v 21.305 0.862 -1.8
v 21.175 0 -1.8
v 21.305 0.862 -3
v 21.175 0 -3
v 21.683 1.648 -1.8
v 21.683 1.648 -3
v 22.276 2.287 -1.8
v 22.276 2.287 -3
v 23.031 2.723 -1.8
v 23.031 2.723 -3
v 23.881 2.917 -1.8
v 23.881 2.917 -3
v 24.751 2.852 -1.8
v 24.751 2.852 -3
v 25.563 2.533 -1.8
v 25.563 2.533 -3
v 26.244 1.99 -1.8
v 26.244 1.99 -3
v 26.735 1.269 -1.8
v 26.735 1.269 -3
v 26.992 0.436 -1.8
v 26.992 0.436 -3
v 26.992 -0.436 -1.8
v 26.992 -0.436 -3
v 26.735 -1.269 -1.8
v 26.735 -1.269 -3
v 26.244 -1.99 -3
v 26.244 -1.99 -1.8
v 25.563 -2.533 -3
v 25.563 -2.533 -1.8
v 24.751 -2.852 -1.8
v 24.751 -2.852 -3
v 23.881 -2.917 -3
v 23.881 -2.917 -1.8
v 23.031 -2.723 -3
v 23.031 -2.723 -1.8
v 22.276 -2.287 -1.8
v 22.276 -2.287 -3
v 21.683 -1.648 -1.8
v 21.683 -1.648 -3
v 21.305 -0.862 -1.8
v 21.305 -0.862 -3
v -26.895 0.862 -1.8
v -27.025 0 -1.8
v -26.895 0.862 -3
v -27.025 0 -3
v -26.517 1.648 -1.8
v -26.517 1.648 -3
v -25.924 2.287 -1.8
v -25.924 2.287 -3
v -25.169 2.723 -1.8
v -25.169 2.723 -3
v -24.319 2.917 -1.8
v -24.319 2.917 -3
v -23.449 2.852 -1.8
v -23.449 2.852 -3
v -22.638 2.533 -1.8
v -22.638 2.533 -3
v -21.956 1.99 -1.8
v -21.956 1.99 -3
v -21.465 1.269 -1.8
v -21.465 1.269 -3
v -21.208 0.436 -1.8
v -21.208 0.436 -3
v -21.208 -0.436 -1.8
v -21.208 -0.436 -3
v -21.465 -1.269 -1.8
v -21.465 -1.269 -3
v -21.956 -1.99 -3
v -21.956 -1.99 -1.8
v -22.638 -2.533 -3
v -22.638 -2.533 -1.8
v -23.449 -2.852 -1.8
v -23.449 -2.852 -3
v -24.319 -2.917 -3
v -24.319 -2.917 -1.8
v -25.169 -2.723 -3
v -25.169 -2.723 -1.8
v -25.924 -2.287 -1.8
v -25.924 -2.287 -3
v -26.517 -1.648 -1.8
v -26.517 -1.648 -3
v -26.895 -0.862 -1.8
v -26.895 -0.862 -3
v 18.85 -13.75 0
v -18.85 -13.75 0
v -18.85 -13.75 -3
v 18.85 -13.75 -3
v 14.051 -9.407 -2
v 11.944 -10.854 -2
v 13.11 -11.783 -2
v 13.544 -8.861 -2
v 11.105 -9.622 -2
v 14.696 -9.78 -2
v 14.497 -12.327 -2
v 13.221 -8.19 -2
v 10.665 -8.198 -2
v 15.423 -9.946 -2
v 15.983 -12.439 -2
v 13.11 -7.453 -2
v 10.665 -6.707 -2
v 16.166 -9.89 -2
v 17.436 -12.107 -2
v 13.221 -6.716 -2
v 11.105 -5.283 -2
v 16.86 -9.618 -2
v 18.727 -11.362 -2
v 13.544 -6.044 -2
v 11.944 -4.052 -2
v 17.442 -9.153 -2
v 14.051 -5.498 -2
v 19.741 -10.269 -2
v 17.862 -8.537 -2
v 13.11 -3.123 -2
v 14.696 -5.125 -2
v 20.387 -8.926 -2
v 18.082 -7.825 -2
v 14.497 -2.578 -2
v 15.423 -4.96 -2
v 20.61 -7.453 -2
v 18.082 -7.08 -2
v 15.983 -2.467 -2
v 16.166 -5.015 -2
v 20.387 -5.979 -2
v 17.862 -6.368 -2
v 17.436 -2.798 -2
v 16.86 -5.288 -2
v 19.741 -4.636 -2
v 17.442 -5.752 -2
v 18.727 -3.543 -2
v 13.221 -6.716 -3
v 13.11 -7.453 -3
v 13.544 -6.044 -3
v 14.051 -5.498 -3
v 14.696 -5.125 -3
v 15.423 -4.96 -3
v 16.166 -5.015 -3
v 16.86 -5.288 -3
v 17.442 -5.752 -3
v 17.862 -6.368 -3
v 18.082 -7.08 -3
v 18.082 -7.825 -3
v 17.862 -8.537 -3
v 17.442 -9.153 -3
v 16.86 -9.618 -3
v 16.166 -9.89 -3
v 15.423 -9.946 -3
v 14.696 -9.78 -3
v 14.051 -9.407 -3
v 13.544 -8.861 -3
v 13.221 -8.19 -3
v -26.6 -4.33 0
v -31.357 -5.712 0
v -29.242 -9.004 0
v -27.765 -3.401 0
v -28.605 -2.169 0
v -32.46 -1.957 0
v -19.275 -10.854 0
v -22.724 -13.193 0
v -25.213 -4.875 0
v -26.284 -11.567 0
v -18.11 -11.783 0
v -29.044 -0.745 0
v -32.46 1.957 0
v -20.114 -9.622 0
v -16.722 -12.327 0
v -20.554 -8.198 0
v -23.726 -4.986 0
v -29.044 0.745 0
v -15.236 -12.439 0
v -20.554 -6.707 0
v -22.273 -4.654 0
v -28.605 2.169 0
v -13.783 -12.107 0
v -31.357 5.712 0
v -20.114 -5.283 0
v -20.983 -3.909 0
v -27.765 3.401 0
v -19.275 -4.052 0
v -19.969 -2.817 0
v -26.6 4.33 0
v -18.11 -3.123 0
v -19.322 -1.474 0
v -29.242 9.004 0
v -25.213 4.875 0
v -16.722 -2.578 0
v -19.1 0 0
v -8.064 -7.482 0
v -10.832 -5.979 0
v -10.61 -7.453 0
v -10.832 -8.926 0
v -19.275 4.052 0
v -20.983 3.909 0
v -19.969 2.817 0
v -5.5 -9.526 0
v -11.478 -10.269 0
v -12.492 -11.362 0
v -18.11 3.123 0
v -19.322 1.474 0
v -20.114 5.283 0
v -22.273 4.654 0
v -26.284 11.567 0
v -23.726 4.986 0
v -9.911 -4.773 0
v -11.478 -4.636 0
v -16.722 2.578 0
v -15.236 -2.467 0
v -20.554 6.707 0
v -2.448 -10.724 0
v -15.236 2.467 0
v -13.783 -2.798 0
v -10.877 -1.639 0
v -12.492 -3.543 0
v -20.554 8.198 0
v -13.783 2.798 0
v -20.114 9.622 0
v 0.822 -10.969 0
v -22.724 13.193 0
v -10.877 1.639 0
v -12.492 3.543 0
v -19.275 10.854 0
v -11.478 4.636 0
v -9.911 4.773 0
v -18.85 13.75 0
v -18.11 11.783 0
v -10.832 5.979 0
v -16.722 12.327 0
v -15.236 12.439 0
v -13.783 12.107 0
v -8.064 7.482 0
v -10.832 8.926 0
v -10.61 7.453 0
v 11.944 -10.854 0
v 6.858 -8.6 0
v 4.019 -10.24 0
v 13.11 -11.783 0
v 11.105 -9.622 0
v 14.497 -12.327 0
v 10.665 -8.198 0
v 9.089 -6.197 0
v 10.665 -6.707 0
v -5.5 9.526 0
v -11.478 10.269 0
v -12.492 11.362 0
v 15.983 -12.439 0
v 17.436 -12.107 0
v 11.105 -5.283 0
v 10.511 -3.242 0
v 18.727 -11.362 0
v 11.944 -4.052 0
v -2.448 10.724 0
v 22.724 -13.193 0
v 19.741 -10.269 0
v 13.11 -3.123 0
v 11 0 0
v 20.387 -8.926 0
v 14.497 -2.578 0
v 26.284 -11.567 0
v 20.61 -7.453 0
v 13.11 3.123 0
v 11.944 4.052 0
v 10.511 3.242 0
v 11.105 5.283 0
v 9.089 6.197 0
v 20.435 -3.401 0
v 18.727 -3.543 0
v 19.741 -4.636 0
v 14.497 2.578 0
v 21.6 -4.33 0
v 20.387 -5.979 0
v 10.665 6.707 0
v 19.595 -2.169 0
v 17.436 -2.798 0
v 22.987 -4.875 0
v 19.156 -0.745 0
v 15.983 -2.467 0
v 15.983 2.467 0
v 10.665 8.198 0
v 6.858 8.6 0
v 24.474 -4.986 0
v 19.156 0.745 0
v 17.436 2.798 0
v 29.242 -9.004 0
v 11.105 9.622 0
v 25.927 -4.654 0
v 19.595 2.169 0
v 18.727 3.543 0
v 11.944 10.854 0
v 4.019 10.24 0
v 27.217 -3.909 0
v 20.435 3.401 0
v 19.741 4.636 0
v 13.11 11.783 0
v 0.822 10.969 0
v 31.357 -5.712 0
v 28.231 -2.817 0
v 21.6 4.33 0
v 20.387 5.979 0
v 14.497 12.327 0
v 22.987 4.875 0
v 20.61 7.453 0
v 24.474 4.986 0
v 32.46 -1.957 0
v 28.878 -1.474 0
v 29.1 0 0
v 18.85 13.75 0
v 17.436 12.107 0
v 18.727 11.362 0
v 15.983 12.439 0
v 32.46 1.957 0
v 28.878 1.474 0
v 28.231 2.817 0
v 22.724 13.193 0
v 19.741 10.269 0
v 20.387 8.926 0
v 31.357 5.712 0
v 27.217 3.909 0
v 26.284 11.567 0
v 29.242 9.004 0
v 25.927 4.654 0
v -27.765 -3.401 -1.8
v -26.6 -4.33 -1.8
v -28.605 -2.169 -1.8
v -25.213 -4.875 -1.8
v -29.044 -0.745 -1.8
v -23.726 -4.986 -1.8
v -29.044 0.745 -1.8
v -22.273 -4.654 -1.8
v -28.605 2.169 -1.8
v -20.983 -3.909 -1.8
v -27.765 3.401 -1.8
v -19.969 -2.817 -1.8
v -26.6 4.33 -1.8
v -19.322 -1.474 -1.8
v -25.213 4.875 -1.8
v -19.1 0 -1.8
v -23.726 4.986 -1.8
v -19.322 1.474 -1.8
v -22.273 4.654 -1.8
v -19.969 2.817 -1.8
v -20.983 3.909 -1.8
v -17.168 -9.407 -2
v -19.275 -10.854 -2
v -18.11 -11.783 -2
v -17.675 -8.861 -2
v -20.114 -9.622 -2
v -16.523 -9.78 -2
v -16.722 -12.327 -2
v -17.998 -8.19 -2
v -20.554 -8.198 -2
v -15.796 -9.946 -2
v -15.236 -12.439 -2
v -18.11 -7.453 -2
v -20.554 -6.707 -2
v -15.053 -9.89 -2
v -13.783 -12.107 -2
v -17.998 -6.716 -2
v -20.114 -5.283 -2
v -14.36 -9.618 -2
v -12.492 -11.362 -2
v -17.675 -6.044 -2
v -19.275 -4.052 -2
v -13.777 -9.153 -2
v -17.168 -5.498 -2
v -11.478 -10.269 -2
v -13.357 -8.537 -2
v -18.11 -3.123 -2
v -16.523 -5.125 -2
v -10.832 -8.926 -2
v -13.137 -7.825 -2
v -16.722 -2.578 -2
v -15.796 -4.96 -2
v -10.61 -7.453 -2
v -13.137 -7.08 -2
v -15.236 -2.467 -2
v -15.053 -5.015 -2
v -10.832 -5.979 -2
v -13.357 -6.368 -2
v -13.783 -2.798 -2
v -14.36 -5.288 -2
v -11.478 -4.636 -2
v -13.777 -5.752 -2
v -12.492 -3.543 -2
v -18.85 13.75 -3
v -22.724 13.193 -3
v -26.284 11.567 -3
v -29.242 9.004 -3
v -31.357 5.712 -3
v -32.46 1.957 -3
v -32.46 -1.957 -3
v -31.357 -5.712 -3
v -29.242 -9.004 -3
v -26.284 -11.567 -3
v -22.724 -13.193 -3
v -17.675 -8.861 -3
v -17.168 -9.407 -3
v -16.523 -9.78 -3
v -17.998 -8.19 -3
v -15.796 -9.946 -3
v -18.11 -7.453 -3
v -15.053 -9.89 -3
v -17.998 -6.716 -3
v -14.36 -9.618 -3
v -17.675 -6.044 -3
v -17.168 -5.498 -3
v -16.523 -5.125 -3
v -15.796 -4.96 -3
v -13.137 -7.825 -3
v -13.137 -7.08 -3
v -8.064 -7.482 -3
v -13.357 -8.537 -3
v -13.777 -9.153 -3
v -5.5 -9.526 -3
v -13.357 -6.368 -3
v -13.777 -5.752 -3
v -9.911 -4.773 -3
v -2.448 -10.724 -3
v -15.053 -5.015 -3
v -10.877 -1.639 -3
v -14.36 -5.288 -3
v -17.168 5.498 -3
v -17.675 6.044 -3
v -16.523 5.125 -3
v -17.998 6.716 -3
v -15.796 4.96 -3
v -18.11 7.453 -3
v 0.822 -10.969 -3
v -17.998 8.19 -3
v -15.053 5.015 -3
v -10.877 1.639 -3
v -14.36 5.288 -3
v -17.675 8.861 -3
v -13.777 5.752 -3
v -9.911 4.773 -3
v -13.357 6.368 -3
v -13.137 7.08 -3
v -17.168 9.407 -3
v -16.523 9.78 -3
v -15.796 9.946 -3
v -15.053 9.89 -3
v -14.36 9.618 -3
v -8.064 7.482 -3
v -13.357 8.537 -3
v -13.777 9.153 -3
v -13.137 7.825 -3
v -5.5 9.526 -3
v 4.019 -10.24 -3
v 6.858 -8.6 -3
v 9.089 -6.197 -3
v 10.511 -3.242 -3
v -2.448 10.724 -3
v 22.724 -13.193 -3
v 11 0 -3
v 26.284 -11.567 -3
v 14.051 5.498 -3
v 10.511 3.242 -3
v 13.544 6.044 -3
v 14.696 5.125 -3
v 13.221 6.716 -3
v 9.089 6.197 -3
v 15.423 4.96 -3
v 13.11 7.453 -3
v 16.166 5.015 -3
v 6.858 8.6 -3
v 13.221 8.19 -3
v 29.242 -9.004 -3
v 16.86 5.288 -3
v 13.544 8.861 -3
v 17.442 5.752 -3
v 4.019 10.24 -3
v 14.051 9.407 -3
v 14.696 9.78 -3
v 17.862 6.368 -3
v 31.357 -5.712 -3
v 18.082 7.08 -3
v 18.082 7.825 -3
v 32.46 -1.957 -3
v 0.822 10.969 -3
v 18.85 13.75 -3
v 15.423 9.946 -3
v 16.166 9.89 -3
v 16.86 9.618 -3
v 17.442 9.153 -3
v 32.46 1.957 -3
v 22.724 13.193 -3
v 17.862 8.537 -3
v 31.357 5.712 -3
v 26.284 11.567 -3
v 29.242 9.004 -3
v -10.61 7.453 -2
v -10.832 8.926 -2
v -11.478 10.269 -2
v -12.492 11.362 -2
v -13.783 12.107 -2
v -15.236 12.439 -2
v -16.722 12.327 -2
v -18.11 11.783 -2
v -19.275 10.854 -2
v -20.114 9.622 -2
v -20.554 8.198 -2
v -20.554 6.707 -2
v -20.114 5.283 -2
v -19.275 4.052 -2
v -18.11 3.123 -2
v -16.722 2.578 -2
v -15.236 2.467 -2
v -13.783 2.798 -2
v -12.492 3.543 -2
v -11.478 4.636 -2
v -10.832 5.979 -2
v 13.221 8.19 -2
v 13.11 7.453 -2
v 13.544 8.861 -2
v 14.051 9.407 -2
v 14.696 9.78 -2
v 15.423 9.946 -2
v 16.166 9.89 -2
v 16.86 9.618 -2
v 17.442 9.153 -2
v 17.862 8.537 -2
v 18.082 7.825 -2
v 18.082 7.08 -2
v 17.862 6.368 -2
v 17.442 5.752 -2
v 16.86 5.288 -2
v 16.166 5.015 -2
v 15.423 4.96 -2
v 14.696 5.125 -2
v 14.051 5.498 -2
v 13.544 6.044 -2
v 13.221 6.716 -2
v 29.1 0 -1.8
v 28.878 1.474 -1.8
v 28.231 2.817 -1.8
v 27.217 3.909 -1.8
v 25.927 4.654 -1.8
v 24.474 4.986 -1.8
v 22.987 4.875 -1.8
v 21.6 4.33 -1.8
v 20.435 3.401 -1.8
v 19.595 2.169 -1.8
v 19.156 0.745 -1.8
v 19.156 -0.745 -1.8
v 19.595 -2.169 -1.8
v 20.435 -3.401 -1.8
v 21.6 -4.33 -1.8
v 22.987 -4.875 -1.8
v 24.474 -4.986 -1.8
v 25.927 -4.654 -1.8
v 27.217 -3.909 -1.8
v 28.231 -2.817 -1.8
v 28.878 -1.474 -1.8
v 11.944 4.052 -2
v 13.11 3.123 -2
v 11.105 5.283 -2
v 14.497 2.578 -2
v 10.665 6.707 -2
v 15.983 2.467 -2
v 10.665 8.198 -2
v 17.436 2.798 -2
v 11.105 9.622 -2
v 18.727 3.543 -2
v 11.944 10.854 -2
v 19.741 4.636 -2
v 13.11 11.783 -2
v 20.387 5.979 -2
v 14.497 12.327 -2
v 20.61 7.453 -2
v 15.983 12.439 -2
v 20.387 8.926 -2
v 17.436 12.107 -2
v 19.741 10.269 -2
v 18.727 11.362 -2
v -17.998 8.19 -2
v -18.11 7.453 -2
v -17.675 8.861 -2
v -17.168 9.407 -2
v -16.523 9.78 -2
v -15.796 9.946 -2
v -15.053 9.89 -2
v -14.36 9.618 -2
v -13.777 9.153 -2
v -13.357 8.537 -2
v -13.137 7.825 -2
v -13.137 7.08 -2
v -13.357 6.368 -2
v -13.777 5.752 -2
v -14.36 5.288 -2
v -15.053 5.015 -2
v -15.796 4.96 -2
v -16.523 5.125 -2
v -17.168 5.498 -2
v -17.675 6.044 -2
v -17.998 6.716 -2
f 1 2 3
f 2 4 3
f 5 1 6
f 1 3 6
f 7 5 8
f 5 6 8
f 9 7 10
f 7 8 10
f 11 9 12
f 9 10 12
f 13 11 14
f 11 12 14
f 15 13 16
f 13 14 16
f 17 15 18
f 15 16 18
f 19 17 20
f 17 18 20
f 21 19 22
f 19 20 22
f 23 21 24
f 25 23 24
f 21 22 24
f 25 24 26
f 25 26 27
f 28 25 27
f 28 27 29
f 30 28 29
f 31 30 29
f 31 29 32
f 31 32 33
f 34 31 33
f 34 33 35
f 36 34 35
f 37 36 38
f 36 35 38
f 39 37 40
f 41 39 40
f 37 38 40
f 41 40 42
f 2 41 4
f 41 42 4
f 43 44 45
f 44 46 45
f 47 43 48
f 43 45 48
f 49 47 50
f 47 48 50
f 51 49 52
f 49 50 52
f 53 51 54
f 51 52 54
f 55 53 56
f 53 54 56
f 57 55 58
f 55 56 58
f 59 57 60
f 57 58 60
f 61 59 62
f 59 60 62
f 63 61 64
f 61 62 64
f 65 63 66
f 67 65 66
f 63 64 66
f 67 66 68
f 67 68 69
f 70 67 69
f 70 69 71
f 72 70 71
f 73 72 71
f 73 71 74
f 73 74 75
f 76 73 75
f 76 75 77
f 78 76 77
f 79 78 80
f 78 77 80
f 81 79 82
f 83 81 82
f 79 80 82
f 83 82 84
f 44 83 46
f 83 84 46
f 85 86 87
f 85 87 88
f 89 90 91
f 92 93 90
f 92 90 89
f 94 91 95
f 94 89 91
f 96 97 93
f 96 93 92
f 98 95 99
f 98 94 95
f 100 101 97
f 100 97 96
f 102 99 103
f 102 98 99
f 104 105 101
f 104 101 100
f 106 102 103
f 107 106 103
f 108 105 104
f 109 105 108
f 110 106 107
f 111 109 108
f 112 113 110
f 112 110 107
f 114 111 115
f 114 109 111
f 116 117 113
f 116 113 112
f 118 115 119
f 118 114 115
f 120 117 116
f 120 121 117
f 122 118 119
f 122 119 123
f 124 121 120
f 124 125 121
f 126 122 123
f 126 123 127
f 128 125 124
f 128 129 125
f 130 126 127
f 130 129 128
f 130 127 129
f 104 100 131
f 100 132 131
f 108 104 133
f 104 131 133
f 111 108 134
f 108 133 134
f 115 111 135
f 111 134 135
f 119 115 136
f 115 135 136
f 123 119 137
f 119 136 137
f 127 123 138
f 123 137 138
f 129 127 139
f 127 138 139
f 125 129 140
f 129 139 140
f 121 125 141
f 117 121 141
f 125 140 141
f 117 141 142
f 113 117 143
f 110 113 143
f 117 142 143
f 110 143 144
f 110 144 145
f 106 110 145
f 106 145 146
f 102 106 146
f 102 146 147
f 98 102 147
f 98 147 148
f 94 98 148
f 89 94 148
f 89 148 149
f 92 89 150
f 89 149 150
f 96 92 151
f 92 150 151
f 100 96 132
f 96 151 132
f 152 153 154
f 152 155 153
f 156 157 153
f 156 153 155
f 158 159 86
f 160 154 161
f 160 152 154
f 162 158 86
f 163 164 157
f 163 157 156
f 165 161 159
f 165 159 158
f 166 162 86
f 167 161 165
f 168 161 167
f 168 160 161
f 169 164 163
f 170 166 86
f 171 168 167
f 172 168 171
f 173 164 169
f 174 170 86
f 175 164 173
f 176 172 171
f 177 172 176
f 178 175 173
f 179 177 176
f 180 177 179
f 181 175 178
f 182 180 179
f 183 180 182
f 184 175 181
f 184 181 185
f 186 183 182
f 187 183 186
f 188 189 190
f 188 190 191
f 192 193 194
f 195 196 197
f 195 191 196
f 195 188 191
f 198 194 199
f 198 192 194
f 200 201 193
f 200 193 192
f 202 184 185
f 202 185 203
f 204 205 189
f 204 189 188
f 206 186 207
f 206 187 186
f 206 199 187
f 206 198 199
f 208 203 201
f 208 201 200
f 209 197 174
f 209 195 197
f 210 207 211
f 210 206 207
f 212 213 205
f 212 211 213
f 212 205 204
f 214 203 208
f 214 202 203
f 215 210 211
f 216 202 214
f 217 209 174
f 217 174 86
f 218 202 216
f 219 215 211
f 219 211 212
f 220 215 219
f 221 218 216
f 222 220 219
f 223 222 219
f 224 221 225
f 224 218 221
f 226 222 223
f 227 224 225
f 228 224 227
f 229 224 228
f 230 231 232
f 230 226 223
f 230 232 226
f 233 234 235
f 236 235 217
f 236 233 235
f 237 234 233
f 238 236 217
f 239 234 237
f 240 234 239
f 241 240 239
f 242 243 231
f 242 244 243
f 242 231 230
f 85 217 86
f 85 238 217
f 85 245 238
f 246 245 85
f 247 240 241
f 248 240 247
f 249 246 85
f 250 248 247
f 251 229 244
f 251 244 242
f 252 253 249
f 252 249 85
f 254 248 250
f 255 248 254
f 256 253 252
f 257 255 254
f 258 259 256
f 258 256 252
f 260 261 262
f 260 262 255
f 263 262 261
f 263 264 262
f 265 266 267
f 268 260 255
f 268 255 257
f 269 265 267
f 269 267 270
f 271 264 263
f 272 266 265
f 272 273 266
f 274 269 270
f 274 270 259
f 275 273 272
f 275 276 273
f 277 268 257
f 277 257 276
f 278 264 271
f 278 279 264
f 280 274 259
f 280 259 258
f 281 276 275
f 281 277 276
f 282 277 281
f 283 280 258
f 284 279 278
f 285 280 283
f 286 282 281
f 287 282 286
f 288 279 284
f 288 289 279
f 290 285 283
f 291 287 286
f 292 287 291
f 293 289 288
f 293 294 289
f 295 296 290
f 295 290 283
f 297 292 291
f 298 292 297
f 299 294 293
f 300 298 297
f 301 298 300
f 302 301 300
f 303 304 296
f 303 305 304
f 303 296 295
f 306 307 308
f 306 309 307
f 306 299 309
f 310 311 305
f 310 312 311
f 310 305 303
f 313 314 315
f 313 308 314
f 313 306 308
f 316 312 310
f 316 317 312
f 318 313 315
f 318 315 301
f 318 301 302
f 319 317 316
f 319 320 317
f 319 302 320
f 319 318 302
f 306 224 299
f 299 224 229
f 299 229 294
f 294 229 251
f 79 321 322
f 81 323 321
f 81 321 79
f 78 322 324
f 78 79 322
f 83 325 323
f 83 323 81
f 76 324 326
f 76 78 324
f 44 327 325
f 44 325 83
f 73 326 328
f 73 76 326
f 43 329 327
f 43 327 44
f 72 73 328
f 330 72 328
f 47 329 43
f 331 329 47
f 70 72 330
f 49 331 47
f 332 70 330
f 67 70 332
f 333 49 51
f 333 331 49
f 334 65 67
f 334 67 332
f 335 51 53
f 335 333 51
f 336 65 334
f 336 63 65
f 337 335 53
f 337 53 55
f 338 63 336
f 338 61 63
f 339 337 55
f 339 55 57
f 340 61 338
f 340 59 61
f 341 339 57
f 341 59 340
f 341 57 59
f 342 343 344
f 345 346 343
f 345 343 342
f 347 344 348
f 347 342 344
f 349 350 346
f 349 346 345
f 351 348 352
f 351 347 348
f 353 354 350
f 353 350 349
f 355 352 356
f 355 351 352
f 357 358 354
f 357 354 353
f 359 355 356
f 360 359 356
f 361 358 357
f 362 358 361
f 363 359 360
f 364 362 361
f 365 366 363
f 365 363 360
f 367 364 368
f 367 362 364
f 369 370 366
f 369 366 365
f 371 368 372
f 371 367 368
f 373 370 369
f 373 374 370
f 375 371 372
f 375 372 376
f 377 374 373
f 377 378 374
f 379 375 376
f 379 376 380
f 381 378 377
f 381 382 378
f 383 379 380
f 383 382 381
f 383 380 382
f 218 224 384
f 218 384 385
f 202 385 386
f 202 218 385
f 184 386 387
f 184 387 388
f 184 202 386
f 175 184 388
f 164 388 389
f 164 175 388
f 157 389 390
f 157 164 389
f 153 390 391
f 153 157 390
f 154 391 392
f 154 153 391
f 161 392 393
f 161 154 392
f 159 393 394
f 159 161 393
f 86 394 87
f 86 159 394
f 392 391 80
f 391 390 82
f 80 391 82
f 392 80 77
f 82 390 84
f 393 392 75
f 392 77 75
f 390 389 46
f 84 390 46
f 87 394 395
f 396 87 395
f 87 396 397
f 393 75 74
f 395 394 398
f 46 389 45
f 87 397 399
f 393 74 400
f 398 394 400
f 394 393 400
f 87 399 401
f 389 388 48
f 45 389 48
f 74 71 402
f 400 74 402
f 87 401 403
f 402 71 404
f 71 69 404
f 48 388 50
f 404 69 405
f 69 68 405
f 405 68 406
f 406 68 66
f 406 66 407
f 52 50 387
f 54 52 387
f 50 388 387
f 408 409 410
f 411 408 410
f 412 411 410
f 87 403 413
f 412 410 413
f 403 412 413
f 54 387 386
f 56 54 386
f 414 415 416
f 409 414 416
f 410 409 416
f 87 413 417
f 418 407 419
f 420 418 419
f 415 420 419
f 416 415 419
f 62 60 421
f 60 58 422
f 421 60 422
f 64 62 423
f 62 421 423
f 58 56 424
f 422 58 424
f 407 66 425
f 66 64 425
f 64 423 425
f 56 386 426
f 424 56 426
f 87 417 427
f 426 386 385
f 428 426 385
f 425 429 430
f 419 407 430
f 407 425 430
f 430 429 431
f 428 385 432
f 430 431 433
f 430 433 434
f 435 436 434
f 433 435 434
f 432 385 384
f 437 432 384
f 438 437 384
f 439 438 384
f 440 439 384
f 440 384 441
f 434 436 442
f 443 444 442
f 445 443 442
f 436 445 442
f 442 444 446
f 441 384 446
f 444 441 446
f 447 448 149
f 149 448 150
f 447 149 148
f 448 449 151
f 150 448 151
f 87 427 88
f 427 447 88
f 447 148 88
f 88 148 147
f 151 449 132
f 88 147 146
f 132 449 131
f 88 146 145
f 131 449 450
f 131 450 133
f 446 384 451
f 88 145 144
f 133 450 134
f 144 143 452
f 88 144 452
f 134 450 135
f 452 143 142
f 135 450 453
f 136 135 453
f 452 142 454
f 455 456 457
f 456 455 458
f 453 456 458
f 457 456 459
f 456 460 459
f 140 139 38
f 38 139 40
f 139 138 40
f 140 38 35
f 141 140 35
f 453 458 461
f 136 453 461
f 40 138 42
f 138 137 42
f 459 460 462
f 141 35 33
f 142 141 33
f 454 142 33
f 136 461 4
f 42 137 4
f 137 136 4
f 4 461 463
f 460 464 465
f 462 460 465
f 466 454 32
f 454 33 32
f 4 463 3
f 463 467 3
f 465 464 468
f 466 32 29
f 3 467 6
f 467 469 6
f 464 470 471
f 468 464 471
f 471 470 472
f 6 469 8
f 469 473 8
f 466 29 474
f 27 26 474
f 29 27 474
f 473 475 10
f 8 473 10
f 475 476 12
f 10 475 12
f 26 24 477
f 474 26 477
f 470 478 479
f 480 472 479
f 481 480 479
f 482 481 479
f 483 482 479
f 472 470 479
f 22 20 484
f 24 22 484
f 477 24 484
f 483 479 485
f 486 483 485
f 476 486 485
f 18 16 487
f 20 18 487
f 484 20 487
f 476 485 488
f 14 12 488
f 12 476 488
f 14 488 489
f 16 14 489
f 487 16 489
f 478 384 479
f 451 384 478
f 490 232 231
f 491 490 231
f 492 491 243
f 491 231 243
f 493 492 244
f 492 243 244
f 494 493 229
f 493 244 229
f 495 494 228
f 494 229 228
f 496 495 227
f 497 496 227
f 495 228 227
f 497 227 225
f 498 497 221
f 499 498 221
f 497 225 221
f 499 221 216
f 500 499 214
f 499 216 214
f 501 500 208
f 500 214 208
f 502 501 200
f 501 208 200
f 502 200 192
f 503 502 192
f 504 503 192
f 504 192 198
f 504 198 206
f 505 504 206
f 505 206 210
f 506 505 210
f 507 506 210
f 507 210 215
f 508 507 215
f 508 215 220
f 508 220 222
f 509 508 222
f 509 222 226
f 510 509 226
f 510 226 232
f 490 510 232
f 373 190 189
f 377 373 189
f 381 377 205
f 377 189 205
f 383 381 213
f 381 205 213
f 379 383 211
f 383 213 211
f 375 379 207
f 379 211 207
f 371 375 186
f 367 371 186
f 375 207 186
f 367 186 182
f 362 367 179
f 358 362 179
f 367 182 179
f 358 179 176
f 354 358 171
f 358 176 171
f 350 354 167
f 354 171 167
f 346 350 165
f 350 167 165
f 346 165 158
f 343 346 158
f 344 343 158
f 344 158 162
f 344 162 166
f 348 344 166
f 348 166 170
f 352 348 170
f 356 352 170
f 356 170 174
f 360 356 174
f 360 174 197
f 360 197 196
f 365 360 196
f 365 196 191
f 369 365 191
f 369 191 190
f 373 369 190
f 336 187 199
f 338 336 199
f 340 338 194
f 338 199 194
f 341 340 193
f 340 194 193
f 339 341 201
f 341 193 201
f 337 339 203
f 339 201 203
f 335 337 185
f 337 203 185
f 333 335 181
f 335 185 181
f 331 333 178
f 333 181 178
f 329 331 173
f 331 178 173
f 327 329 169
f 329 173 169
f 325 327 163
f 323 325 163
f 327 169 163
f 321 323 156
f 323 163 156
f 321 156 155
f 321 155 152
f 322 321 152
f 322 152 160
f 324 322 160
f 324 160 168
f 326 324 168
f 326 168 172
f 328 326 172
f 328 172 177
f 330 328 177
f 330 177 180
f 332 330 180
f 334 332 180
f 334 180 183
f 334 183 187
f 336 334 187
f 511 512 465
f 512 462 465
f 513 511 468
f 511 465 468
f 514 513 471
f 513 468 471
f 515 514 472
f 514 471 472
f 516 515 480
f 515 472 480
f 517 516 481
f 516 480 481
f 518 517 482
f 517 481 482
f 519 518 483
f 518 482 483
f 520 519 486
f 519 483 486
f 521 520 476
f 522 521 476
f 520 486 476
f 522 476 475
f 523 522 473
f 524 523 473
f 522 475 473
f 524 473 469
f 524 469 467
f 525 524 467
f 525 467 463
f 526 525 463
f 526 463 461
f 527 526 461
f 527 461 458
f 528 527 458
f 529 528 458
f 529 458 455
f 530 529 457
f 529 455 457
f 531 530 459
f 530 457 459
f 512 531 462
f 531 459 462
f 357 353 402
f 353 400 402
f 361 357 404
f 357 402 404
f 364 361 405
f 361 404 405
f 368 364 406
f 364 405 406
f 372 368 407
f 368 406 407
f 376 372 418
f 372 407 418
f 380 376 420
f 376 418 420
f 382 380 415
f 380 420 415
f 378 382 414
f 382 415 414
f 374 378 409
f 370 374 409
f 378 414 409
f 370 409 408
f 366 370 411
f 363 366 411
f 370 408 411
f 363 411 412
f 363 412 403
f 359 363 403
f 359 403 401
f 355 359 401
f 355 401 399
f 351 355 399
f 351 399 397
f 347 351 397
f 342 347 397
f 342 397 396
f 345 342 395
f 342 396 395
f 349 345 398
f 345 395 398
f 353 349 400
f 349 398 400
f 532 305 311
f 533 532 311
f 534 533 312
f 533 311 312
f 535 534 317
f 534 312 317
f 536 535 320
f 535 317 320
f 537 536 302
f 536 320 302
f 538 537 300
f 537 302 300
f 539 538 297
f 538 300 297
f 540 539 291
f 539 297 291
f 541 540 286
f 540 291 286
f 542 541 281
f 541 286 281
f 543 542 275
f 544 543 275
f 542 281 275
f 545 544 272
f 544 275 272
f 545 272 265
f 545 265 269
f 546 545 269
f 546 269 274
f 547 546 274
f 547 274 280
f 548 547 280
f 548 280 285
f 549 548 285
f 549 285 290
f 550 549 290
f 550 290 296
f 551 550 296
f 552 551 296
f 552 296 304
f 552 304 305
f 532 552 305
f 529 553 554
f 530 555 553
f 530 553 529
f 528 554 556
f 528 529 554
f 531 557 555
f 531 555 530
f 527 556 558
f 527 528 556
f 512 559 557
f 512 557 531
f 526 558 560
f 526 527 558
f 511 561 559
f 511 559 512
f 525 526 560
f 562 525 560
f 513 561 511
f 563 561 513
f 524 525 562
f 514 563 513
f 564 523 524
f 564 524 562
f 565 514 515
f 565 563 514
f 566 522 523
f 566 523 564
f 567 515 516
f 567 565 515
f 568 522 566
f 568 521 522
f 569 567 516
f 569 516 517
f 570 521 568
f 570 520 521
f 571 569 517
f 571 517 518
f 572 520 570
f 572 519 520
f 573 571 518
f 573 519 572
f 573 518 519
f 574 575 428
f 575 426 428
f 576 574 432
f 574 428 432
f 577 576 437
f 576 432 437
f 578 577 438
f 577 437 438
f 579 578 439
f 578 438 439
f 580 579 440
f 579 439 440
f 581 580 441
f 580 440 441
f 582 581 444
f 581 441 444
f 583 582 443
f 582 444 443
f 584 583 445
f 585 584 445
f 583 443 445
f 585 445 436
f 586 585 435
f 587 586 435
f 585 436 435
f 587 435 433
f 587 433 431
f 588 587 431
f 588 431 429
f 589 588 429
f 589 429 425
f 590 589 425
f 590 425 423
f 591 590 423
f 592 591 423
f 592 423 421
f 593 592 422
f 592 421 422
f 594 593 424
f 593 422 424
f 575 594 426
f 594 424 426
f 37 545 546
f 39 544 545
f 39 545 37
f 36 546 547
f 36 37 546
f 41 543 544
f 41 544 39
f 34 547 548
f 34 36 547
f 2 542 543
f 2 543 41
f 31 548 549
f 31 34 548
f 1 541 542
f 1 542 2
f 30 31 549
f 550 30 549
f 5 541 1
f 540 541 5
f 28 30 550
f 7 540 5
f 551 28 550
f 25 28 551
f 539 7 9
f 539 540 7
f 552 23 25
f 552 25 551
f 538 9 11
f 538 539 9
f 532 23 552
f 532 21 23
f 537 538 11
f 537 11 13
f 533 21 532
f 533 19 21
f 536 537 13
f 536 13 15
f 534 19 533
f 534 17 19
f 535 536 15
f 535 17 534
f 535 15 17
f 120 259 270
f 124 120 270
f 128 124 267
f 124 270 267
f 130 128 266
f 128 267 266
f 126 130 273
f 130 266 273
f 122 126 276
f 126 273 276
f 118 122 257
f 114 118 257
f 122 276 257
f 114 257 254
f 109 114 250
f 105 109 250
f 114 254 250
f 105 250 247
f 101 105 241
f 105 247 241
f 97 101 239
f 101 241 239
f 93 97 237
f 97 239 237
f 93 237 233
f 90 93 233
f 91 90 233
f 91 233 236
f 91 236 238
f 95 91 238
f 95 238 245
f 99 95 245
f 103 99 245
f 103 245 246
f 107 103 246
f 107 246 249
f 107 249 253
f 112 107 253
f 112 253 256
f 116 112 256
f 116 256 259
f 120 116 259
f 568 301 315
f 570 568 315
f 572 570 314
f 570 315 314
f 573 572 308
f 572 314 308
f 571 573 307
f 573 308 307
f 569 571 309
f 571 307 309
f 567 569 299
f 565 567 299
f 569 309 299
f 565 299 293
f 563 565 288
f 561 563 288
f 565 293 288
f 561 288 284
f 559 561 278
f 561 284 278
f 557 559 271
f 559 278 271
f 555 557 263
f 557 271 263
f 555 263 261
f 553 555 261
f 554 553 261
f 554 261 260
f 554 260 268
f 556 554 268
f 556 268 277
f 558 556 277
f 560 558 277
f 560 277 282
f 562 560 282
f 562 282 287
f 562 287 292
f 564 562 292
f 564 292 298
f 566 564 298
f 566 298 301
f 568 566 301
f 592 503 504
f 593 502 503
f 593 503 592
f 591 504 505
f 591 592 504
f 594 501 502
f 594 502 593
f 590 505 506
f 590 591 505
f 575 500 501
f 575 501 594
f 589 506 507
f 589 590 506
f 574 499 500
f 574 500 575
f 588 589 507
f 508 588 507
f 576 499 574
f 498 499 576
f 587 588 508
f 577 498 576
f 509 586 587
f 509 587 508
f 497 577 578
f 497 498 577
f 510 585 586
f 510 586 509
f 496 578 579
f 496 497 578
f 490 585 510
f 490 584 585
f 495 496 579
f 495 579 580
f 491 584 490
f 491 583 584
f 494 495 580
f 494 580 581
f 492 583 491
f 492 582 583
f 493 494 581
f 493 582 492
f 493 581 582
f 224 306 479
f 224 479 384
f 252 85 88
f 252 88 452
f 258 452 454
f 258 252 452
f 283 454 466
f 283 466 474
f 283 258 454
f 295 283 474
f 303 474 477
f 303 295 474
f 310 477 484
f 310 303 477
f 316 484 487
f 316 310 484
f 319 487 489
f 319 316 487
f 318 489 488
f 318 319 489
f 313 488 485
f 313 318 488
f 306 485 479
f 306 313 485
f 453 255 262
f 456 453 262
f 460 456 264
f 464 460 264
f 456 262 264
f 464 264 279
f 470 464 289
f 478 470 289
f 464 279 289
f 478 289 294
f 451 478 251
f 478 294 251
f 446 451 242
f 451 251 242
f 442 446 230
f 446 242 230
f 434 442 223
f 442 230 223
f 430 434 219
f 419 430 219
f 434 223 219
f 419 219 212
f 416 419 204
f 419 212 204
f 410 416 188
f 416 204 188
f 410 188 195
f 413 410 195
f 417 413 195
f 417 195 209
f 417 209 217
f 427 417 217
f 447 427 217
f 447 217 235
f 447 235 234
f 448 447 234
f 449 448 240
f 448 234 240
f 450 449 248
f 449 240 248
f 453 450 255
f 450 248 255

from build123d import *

# Parameters (mm, degrees)
F0_R           = 11
F1_DEPTH       = 3
F2_D           = 5.85
F2_CBORE_D     = 10
F2_CBORE_DEPTH = 1.8
F3_D           = 5
F3_CBORE_D     = 10
F3_CBORE_DEPTH = 2


# Not quite as in the source:
# - a feature names something its author has since deleted; it is built from what else it names


with BuildPart() as f1:
    # F0 (on Top) → F1 (new body)
    with BuildSketch(Plane.XY):
        with BuildLine():
            Line((18.85, 13.75), (-18.85, 13.75))
            ThreePointArc((-18.85, 13.75), (-32.6, 0), (-18.85, -13.75))
            Line((-18.85, -13.75), (18.85, -13.75))
            ThreePointArc((18.85, -13.75), (32.6, 0), (18.85, 13.75))
        make_face()
        Circle(F0_R, mode=Mode.SUBTRACT)
    extrude(amount=-F1_DEPTH)

    # F2 (through all)
    with Locations(Plane.XY):
        with Locations((24.1, 0), (-24.1, 0)):
            CounterBoreHole(F2_D / 2, F2_CBORE_D / 2, F2_CBORE_DEPTH)

    # F3 (through all)
    with Locations(Plane.XY):
        with Locations((-15.6095083693, 7.4526413832), (-15.6095083693, -7.4526413832), (15.6095083693, -7.4526413832), (15.6095083693, 7.4526413832)):
            CounterBoreHole(F3_D / 2, F3_CBORE_D / 2, F3_CBORE_DEPTH)


solid = f1.part
